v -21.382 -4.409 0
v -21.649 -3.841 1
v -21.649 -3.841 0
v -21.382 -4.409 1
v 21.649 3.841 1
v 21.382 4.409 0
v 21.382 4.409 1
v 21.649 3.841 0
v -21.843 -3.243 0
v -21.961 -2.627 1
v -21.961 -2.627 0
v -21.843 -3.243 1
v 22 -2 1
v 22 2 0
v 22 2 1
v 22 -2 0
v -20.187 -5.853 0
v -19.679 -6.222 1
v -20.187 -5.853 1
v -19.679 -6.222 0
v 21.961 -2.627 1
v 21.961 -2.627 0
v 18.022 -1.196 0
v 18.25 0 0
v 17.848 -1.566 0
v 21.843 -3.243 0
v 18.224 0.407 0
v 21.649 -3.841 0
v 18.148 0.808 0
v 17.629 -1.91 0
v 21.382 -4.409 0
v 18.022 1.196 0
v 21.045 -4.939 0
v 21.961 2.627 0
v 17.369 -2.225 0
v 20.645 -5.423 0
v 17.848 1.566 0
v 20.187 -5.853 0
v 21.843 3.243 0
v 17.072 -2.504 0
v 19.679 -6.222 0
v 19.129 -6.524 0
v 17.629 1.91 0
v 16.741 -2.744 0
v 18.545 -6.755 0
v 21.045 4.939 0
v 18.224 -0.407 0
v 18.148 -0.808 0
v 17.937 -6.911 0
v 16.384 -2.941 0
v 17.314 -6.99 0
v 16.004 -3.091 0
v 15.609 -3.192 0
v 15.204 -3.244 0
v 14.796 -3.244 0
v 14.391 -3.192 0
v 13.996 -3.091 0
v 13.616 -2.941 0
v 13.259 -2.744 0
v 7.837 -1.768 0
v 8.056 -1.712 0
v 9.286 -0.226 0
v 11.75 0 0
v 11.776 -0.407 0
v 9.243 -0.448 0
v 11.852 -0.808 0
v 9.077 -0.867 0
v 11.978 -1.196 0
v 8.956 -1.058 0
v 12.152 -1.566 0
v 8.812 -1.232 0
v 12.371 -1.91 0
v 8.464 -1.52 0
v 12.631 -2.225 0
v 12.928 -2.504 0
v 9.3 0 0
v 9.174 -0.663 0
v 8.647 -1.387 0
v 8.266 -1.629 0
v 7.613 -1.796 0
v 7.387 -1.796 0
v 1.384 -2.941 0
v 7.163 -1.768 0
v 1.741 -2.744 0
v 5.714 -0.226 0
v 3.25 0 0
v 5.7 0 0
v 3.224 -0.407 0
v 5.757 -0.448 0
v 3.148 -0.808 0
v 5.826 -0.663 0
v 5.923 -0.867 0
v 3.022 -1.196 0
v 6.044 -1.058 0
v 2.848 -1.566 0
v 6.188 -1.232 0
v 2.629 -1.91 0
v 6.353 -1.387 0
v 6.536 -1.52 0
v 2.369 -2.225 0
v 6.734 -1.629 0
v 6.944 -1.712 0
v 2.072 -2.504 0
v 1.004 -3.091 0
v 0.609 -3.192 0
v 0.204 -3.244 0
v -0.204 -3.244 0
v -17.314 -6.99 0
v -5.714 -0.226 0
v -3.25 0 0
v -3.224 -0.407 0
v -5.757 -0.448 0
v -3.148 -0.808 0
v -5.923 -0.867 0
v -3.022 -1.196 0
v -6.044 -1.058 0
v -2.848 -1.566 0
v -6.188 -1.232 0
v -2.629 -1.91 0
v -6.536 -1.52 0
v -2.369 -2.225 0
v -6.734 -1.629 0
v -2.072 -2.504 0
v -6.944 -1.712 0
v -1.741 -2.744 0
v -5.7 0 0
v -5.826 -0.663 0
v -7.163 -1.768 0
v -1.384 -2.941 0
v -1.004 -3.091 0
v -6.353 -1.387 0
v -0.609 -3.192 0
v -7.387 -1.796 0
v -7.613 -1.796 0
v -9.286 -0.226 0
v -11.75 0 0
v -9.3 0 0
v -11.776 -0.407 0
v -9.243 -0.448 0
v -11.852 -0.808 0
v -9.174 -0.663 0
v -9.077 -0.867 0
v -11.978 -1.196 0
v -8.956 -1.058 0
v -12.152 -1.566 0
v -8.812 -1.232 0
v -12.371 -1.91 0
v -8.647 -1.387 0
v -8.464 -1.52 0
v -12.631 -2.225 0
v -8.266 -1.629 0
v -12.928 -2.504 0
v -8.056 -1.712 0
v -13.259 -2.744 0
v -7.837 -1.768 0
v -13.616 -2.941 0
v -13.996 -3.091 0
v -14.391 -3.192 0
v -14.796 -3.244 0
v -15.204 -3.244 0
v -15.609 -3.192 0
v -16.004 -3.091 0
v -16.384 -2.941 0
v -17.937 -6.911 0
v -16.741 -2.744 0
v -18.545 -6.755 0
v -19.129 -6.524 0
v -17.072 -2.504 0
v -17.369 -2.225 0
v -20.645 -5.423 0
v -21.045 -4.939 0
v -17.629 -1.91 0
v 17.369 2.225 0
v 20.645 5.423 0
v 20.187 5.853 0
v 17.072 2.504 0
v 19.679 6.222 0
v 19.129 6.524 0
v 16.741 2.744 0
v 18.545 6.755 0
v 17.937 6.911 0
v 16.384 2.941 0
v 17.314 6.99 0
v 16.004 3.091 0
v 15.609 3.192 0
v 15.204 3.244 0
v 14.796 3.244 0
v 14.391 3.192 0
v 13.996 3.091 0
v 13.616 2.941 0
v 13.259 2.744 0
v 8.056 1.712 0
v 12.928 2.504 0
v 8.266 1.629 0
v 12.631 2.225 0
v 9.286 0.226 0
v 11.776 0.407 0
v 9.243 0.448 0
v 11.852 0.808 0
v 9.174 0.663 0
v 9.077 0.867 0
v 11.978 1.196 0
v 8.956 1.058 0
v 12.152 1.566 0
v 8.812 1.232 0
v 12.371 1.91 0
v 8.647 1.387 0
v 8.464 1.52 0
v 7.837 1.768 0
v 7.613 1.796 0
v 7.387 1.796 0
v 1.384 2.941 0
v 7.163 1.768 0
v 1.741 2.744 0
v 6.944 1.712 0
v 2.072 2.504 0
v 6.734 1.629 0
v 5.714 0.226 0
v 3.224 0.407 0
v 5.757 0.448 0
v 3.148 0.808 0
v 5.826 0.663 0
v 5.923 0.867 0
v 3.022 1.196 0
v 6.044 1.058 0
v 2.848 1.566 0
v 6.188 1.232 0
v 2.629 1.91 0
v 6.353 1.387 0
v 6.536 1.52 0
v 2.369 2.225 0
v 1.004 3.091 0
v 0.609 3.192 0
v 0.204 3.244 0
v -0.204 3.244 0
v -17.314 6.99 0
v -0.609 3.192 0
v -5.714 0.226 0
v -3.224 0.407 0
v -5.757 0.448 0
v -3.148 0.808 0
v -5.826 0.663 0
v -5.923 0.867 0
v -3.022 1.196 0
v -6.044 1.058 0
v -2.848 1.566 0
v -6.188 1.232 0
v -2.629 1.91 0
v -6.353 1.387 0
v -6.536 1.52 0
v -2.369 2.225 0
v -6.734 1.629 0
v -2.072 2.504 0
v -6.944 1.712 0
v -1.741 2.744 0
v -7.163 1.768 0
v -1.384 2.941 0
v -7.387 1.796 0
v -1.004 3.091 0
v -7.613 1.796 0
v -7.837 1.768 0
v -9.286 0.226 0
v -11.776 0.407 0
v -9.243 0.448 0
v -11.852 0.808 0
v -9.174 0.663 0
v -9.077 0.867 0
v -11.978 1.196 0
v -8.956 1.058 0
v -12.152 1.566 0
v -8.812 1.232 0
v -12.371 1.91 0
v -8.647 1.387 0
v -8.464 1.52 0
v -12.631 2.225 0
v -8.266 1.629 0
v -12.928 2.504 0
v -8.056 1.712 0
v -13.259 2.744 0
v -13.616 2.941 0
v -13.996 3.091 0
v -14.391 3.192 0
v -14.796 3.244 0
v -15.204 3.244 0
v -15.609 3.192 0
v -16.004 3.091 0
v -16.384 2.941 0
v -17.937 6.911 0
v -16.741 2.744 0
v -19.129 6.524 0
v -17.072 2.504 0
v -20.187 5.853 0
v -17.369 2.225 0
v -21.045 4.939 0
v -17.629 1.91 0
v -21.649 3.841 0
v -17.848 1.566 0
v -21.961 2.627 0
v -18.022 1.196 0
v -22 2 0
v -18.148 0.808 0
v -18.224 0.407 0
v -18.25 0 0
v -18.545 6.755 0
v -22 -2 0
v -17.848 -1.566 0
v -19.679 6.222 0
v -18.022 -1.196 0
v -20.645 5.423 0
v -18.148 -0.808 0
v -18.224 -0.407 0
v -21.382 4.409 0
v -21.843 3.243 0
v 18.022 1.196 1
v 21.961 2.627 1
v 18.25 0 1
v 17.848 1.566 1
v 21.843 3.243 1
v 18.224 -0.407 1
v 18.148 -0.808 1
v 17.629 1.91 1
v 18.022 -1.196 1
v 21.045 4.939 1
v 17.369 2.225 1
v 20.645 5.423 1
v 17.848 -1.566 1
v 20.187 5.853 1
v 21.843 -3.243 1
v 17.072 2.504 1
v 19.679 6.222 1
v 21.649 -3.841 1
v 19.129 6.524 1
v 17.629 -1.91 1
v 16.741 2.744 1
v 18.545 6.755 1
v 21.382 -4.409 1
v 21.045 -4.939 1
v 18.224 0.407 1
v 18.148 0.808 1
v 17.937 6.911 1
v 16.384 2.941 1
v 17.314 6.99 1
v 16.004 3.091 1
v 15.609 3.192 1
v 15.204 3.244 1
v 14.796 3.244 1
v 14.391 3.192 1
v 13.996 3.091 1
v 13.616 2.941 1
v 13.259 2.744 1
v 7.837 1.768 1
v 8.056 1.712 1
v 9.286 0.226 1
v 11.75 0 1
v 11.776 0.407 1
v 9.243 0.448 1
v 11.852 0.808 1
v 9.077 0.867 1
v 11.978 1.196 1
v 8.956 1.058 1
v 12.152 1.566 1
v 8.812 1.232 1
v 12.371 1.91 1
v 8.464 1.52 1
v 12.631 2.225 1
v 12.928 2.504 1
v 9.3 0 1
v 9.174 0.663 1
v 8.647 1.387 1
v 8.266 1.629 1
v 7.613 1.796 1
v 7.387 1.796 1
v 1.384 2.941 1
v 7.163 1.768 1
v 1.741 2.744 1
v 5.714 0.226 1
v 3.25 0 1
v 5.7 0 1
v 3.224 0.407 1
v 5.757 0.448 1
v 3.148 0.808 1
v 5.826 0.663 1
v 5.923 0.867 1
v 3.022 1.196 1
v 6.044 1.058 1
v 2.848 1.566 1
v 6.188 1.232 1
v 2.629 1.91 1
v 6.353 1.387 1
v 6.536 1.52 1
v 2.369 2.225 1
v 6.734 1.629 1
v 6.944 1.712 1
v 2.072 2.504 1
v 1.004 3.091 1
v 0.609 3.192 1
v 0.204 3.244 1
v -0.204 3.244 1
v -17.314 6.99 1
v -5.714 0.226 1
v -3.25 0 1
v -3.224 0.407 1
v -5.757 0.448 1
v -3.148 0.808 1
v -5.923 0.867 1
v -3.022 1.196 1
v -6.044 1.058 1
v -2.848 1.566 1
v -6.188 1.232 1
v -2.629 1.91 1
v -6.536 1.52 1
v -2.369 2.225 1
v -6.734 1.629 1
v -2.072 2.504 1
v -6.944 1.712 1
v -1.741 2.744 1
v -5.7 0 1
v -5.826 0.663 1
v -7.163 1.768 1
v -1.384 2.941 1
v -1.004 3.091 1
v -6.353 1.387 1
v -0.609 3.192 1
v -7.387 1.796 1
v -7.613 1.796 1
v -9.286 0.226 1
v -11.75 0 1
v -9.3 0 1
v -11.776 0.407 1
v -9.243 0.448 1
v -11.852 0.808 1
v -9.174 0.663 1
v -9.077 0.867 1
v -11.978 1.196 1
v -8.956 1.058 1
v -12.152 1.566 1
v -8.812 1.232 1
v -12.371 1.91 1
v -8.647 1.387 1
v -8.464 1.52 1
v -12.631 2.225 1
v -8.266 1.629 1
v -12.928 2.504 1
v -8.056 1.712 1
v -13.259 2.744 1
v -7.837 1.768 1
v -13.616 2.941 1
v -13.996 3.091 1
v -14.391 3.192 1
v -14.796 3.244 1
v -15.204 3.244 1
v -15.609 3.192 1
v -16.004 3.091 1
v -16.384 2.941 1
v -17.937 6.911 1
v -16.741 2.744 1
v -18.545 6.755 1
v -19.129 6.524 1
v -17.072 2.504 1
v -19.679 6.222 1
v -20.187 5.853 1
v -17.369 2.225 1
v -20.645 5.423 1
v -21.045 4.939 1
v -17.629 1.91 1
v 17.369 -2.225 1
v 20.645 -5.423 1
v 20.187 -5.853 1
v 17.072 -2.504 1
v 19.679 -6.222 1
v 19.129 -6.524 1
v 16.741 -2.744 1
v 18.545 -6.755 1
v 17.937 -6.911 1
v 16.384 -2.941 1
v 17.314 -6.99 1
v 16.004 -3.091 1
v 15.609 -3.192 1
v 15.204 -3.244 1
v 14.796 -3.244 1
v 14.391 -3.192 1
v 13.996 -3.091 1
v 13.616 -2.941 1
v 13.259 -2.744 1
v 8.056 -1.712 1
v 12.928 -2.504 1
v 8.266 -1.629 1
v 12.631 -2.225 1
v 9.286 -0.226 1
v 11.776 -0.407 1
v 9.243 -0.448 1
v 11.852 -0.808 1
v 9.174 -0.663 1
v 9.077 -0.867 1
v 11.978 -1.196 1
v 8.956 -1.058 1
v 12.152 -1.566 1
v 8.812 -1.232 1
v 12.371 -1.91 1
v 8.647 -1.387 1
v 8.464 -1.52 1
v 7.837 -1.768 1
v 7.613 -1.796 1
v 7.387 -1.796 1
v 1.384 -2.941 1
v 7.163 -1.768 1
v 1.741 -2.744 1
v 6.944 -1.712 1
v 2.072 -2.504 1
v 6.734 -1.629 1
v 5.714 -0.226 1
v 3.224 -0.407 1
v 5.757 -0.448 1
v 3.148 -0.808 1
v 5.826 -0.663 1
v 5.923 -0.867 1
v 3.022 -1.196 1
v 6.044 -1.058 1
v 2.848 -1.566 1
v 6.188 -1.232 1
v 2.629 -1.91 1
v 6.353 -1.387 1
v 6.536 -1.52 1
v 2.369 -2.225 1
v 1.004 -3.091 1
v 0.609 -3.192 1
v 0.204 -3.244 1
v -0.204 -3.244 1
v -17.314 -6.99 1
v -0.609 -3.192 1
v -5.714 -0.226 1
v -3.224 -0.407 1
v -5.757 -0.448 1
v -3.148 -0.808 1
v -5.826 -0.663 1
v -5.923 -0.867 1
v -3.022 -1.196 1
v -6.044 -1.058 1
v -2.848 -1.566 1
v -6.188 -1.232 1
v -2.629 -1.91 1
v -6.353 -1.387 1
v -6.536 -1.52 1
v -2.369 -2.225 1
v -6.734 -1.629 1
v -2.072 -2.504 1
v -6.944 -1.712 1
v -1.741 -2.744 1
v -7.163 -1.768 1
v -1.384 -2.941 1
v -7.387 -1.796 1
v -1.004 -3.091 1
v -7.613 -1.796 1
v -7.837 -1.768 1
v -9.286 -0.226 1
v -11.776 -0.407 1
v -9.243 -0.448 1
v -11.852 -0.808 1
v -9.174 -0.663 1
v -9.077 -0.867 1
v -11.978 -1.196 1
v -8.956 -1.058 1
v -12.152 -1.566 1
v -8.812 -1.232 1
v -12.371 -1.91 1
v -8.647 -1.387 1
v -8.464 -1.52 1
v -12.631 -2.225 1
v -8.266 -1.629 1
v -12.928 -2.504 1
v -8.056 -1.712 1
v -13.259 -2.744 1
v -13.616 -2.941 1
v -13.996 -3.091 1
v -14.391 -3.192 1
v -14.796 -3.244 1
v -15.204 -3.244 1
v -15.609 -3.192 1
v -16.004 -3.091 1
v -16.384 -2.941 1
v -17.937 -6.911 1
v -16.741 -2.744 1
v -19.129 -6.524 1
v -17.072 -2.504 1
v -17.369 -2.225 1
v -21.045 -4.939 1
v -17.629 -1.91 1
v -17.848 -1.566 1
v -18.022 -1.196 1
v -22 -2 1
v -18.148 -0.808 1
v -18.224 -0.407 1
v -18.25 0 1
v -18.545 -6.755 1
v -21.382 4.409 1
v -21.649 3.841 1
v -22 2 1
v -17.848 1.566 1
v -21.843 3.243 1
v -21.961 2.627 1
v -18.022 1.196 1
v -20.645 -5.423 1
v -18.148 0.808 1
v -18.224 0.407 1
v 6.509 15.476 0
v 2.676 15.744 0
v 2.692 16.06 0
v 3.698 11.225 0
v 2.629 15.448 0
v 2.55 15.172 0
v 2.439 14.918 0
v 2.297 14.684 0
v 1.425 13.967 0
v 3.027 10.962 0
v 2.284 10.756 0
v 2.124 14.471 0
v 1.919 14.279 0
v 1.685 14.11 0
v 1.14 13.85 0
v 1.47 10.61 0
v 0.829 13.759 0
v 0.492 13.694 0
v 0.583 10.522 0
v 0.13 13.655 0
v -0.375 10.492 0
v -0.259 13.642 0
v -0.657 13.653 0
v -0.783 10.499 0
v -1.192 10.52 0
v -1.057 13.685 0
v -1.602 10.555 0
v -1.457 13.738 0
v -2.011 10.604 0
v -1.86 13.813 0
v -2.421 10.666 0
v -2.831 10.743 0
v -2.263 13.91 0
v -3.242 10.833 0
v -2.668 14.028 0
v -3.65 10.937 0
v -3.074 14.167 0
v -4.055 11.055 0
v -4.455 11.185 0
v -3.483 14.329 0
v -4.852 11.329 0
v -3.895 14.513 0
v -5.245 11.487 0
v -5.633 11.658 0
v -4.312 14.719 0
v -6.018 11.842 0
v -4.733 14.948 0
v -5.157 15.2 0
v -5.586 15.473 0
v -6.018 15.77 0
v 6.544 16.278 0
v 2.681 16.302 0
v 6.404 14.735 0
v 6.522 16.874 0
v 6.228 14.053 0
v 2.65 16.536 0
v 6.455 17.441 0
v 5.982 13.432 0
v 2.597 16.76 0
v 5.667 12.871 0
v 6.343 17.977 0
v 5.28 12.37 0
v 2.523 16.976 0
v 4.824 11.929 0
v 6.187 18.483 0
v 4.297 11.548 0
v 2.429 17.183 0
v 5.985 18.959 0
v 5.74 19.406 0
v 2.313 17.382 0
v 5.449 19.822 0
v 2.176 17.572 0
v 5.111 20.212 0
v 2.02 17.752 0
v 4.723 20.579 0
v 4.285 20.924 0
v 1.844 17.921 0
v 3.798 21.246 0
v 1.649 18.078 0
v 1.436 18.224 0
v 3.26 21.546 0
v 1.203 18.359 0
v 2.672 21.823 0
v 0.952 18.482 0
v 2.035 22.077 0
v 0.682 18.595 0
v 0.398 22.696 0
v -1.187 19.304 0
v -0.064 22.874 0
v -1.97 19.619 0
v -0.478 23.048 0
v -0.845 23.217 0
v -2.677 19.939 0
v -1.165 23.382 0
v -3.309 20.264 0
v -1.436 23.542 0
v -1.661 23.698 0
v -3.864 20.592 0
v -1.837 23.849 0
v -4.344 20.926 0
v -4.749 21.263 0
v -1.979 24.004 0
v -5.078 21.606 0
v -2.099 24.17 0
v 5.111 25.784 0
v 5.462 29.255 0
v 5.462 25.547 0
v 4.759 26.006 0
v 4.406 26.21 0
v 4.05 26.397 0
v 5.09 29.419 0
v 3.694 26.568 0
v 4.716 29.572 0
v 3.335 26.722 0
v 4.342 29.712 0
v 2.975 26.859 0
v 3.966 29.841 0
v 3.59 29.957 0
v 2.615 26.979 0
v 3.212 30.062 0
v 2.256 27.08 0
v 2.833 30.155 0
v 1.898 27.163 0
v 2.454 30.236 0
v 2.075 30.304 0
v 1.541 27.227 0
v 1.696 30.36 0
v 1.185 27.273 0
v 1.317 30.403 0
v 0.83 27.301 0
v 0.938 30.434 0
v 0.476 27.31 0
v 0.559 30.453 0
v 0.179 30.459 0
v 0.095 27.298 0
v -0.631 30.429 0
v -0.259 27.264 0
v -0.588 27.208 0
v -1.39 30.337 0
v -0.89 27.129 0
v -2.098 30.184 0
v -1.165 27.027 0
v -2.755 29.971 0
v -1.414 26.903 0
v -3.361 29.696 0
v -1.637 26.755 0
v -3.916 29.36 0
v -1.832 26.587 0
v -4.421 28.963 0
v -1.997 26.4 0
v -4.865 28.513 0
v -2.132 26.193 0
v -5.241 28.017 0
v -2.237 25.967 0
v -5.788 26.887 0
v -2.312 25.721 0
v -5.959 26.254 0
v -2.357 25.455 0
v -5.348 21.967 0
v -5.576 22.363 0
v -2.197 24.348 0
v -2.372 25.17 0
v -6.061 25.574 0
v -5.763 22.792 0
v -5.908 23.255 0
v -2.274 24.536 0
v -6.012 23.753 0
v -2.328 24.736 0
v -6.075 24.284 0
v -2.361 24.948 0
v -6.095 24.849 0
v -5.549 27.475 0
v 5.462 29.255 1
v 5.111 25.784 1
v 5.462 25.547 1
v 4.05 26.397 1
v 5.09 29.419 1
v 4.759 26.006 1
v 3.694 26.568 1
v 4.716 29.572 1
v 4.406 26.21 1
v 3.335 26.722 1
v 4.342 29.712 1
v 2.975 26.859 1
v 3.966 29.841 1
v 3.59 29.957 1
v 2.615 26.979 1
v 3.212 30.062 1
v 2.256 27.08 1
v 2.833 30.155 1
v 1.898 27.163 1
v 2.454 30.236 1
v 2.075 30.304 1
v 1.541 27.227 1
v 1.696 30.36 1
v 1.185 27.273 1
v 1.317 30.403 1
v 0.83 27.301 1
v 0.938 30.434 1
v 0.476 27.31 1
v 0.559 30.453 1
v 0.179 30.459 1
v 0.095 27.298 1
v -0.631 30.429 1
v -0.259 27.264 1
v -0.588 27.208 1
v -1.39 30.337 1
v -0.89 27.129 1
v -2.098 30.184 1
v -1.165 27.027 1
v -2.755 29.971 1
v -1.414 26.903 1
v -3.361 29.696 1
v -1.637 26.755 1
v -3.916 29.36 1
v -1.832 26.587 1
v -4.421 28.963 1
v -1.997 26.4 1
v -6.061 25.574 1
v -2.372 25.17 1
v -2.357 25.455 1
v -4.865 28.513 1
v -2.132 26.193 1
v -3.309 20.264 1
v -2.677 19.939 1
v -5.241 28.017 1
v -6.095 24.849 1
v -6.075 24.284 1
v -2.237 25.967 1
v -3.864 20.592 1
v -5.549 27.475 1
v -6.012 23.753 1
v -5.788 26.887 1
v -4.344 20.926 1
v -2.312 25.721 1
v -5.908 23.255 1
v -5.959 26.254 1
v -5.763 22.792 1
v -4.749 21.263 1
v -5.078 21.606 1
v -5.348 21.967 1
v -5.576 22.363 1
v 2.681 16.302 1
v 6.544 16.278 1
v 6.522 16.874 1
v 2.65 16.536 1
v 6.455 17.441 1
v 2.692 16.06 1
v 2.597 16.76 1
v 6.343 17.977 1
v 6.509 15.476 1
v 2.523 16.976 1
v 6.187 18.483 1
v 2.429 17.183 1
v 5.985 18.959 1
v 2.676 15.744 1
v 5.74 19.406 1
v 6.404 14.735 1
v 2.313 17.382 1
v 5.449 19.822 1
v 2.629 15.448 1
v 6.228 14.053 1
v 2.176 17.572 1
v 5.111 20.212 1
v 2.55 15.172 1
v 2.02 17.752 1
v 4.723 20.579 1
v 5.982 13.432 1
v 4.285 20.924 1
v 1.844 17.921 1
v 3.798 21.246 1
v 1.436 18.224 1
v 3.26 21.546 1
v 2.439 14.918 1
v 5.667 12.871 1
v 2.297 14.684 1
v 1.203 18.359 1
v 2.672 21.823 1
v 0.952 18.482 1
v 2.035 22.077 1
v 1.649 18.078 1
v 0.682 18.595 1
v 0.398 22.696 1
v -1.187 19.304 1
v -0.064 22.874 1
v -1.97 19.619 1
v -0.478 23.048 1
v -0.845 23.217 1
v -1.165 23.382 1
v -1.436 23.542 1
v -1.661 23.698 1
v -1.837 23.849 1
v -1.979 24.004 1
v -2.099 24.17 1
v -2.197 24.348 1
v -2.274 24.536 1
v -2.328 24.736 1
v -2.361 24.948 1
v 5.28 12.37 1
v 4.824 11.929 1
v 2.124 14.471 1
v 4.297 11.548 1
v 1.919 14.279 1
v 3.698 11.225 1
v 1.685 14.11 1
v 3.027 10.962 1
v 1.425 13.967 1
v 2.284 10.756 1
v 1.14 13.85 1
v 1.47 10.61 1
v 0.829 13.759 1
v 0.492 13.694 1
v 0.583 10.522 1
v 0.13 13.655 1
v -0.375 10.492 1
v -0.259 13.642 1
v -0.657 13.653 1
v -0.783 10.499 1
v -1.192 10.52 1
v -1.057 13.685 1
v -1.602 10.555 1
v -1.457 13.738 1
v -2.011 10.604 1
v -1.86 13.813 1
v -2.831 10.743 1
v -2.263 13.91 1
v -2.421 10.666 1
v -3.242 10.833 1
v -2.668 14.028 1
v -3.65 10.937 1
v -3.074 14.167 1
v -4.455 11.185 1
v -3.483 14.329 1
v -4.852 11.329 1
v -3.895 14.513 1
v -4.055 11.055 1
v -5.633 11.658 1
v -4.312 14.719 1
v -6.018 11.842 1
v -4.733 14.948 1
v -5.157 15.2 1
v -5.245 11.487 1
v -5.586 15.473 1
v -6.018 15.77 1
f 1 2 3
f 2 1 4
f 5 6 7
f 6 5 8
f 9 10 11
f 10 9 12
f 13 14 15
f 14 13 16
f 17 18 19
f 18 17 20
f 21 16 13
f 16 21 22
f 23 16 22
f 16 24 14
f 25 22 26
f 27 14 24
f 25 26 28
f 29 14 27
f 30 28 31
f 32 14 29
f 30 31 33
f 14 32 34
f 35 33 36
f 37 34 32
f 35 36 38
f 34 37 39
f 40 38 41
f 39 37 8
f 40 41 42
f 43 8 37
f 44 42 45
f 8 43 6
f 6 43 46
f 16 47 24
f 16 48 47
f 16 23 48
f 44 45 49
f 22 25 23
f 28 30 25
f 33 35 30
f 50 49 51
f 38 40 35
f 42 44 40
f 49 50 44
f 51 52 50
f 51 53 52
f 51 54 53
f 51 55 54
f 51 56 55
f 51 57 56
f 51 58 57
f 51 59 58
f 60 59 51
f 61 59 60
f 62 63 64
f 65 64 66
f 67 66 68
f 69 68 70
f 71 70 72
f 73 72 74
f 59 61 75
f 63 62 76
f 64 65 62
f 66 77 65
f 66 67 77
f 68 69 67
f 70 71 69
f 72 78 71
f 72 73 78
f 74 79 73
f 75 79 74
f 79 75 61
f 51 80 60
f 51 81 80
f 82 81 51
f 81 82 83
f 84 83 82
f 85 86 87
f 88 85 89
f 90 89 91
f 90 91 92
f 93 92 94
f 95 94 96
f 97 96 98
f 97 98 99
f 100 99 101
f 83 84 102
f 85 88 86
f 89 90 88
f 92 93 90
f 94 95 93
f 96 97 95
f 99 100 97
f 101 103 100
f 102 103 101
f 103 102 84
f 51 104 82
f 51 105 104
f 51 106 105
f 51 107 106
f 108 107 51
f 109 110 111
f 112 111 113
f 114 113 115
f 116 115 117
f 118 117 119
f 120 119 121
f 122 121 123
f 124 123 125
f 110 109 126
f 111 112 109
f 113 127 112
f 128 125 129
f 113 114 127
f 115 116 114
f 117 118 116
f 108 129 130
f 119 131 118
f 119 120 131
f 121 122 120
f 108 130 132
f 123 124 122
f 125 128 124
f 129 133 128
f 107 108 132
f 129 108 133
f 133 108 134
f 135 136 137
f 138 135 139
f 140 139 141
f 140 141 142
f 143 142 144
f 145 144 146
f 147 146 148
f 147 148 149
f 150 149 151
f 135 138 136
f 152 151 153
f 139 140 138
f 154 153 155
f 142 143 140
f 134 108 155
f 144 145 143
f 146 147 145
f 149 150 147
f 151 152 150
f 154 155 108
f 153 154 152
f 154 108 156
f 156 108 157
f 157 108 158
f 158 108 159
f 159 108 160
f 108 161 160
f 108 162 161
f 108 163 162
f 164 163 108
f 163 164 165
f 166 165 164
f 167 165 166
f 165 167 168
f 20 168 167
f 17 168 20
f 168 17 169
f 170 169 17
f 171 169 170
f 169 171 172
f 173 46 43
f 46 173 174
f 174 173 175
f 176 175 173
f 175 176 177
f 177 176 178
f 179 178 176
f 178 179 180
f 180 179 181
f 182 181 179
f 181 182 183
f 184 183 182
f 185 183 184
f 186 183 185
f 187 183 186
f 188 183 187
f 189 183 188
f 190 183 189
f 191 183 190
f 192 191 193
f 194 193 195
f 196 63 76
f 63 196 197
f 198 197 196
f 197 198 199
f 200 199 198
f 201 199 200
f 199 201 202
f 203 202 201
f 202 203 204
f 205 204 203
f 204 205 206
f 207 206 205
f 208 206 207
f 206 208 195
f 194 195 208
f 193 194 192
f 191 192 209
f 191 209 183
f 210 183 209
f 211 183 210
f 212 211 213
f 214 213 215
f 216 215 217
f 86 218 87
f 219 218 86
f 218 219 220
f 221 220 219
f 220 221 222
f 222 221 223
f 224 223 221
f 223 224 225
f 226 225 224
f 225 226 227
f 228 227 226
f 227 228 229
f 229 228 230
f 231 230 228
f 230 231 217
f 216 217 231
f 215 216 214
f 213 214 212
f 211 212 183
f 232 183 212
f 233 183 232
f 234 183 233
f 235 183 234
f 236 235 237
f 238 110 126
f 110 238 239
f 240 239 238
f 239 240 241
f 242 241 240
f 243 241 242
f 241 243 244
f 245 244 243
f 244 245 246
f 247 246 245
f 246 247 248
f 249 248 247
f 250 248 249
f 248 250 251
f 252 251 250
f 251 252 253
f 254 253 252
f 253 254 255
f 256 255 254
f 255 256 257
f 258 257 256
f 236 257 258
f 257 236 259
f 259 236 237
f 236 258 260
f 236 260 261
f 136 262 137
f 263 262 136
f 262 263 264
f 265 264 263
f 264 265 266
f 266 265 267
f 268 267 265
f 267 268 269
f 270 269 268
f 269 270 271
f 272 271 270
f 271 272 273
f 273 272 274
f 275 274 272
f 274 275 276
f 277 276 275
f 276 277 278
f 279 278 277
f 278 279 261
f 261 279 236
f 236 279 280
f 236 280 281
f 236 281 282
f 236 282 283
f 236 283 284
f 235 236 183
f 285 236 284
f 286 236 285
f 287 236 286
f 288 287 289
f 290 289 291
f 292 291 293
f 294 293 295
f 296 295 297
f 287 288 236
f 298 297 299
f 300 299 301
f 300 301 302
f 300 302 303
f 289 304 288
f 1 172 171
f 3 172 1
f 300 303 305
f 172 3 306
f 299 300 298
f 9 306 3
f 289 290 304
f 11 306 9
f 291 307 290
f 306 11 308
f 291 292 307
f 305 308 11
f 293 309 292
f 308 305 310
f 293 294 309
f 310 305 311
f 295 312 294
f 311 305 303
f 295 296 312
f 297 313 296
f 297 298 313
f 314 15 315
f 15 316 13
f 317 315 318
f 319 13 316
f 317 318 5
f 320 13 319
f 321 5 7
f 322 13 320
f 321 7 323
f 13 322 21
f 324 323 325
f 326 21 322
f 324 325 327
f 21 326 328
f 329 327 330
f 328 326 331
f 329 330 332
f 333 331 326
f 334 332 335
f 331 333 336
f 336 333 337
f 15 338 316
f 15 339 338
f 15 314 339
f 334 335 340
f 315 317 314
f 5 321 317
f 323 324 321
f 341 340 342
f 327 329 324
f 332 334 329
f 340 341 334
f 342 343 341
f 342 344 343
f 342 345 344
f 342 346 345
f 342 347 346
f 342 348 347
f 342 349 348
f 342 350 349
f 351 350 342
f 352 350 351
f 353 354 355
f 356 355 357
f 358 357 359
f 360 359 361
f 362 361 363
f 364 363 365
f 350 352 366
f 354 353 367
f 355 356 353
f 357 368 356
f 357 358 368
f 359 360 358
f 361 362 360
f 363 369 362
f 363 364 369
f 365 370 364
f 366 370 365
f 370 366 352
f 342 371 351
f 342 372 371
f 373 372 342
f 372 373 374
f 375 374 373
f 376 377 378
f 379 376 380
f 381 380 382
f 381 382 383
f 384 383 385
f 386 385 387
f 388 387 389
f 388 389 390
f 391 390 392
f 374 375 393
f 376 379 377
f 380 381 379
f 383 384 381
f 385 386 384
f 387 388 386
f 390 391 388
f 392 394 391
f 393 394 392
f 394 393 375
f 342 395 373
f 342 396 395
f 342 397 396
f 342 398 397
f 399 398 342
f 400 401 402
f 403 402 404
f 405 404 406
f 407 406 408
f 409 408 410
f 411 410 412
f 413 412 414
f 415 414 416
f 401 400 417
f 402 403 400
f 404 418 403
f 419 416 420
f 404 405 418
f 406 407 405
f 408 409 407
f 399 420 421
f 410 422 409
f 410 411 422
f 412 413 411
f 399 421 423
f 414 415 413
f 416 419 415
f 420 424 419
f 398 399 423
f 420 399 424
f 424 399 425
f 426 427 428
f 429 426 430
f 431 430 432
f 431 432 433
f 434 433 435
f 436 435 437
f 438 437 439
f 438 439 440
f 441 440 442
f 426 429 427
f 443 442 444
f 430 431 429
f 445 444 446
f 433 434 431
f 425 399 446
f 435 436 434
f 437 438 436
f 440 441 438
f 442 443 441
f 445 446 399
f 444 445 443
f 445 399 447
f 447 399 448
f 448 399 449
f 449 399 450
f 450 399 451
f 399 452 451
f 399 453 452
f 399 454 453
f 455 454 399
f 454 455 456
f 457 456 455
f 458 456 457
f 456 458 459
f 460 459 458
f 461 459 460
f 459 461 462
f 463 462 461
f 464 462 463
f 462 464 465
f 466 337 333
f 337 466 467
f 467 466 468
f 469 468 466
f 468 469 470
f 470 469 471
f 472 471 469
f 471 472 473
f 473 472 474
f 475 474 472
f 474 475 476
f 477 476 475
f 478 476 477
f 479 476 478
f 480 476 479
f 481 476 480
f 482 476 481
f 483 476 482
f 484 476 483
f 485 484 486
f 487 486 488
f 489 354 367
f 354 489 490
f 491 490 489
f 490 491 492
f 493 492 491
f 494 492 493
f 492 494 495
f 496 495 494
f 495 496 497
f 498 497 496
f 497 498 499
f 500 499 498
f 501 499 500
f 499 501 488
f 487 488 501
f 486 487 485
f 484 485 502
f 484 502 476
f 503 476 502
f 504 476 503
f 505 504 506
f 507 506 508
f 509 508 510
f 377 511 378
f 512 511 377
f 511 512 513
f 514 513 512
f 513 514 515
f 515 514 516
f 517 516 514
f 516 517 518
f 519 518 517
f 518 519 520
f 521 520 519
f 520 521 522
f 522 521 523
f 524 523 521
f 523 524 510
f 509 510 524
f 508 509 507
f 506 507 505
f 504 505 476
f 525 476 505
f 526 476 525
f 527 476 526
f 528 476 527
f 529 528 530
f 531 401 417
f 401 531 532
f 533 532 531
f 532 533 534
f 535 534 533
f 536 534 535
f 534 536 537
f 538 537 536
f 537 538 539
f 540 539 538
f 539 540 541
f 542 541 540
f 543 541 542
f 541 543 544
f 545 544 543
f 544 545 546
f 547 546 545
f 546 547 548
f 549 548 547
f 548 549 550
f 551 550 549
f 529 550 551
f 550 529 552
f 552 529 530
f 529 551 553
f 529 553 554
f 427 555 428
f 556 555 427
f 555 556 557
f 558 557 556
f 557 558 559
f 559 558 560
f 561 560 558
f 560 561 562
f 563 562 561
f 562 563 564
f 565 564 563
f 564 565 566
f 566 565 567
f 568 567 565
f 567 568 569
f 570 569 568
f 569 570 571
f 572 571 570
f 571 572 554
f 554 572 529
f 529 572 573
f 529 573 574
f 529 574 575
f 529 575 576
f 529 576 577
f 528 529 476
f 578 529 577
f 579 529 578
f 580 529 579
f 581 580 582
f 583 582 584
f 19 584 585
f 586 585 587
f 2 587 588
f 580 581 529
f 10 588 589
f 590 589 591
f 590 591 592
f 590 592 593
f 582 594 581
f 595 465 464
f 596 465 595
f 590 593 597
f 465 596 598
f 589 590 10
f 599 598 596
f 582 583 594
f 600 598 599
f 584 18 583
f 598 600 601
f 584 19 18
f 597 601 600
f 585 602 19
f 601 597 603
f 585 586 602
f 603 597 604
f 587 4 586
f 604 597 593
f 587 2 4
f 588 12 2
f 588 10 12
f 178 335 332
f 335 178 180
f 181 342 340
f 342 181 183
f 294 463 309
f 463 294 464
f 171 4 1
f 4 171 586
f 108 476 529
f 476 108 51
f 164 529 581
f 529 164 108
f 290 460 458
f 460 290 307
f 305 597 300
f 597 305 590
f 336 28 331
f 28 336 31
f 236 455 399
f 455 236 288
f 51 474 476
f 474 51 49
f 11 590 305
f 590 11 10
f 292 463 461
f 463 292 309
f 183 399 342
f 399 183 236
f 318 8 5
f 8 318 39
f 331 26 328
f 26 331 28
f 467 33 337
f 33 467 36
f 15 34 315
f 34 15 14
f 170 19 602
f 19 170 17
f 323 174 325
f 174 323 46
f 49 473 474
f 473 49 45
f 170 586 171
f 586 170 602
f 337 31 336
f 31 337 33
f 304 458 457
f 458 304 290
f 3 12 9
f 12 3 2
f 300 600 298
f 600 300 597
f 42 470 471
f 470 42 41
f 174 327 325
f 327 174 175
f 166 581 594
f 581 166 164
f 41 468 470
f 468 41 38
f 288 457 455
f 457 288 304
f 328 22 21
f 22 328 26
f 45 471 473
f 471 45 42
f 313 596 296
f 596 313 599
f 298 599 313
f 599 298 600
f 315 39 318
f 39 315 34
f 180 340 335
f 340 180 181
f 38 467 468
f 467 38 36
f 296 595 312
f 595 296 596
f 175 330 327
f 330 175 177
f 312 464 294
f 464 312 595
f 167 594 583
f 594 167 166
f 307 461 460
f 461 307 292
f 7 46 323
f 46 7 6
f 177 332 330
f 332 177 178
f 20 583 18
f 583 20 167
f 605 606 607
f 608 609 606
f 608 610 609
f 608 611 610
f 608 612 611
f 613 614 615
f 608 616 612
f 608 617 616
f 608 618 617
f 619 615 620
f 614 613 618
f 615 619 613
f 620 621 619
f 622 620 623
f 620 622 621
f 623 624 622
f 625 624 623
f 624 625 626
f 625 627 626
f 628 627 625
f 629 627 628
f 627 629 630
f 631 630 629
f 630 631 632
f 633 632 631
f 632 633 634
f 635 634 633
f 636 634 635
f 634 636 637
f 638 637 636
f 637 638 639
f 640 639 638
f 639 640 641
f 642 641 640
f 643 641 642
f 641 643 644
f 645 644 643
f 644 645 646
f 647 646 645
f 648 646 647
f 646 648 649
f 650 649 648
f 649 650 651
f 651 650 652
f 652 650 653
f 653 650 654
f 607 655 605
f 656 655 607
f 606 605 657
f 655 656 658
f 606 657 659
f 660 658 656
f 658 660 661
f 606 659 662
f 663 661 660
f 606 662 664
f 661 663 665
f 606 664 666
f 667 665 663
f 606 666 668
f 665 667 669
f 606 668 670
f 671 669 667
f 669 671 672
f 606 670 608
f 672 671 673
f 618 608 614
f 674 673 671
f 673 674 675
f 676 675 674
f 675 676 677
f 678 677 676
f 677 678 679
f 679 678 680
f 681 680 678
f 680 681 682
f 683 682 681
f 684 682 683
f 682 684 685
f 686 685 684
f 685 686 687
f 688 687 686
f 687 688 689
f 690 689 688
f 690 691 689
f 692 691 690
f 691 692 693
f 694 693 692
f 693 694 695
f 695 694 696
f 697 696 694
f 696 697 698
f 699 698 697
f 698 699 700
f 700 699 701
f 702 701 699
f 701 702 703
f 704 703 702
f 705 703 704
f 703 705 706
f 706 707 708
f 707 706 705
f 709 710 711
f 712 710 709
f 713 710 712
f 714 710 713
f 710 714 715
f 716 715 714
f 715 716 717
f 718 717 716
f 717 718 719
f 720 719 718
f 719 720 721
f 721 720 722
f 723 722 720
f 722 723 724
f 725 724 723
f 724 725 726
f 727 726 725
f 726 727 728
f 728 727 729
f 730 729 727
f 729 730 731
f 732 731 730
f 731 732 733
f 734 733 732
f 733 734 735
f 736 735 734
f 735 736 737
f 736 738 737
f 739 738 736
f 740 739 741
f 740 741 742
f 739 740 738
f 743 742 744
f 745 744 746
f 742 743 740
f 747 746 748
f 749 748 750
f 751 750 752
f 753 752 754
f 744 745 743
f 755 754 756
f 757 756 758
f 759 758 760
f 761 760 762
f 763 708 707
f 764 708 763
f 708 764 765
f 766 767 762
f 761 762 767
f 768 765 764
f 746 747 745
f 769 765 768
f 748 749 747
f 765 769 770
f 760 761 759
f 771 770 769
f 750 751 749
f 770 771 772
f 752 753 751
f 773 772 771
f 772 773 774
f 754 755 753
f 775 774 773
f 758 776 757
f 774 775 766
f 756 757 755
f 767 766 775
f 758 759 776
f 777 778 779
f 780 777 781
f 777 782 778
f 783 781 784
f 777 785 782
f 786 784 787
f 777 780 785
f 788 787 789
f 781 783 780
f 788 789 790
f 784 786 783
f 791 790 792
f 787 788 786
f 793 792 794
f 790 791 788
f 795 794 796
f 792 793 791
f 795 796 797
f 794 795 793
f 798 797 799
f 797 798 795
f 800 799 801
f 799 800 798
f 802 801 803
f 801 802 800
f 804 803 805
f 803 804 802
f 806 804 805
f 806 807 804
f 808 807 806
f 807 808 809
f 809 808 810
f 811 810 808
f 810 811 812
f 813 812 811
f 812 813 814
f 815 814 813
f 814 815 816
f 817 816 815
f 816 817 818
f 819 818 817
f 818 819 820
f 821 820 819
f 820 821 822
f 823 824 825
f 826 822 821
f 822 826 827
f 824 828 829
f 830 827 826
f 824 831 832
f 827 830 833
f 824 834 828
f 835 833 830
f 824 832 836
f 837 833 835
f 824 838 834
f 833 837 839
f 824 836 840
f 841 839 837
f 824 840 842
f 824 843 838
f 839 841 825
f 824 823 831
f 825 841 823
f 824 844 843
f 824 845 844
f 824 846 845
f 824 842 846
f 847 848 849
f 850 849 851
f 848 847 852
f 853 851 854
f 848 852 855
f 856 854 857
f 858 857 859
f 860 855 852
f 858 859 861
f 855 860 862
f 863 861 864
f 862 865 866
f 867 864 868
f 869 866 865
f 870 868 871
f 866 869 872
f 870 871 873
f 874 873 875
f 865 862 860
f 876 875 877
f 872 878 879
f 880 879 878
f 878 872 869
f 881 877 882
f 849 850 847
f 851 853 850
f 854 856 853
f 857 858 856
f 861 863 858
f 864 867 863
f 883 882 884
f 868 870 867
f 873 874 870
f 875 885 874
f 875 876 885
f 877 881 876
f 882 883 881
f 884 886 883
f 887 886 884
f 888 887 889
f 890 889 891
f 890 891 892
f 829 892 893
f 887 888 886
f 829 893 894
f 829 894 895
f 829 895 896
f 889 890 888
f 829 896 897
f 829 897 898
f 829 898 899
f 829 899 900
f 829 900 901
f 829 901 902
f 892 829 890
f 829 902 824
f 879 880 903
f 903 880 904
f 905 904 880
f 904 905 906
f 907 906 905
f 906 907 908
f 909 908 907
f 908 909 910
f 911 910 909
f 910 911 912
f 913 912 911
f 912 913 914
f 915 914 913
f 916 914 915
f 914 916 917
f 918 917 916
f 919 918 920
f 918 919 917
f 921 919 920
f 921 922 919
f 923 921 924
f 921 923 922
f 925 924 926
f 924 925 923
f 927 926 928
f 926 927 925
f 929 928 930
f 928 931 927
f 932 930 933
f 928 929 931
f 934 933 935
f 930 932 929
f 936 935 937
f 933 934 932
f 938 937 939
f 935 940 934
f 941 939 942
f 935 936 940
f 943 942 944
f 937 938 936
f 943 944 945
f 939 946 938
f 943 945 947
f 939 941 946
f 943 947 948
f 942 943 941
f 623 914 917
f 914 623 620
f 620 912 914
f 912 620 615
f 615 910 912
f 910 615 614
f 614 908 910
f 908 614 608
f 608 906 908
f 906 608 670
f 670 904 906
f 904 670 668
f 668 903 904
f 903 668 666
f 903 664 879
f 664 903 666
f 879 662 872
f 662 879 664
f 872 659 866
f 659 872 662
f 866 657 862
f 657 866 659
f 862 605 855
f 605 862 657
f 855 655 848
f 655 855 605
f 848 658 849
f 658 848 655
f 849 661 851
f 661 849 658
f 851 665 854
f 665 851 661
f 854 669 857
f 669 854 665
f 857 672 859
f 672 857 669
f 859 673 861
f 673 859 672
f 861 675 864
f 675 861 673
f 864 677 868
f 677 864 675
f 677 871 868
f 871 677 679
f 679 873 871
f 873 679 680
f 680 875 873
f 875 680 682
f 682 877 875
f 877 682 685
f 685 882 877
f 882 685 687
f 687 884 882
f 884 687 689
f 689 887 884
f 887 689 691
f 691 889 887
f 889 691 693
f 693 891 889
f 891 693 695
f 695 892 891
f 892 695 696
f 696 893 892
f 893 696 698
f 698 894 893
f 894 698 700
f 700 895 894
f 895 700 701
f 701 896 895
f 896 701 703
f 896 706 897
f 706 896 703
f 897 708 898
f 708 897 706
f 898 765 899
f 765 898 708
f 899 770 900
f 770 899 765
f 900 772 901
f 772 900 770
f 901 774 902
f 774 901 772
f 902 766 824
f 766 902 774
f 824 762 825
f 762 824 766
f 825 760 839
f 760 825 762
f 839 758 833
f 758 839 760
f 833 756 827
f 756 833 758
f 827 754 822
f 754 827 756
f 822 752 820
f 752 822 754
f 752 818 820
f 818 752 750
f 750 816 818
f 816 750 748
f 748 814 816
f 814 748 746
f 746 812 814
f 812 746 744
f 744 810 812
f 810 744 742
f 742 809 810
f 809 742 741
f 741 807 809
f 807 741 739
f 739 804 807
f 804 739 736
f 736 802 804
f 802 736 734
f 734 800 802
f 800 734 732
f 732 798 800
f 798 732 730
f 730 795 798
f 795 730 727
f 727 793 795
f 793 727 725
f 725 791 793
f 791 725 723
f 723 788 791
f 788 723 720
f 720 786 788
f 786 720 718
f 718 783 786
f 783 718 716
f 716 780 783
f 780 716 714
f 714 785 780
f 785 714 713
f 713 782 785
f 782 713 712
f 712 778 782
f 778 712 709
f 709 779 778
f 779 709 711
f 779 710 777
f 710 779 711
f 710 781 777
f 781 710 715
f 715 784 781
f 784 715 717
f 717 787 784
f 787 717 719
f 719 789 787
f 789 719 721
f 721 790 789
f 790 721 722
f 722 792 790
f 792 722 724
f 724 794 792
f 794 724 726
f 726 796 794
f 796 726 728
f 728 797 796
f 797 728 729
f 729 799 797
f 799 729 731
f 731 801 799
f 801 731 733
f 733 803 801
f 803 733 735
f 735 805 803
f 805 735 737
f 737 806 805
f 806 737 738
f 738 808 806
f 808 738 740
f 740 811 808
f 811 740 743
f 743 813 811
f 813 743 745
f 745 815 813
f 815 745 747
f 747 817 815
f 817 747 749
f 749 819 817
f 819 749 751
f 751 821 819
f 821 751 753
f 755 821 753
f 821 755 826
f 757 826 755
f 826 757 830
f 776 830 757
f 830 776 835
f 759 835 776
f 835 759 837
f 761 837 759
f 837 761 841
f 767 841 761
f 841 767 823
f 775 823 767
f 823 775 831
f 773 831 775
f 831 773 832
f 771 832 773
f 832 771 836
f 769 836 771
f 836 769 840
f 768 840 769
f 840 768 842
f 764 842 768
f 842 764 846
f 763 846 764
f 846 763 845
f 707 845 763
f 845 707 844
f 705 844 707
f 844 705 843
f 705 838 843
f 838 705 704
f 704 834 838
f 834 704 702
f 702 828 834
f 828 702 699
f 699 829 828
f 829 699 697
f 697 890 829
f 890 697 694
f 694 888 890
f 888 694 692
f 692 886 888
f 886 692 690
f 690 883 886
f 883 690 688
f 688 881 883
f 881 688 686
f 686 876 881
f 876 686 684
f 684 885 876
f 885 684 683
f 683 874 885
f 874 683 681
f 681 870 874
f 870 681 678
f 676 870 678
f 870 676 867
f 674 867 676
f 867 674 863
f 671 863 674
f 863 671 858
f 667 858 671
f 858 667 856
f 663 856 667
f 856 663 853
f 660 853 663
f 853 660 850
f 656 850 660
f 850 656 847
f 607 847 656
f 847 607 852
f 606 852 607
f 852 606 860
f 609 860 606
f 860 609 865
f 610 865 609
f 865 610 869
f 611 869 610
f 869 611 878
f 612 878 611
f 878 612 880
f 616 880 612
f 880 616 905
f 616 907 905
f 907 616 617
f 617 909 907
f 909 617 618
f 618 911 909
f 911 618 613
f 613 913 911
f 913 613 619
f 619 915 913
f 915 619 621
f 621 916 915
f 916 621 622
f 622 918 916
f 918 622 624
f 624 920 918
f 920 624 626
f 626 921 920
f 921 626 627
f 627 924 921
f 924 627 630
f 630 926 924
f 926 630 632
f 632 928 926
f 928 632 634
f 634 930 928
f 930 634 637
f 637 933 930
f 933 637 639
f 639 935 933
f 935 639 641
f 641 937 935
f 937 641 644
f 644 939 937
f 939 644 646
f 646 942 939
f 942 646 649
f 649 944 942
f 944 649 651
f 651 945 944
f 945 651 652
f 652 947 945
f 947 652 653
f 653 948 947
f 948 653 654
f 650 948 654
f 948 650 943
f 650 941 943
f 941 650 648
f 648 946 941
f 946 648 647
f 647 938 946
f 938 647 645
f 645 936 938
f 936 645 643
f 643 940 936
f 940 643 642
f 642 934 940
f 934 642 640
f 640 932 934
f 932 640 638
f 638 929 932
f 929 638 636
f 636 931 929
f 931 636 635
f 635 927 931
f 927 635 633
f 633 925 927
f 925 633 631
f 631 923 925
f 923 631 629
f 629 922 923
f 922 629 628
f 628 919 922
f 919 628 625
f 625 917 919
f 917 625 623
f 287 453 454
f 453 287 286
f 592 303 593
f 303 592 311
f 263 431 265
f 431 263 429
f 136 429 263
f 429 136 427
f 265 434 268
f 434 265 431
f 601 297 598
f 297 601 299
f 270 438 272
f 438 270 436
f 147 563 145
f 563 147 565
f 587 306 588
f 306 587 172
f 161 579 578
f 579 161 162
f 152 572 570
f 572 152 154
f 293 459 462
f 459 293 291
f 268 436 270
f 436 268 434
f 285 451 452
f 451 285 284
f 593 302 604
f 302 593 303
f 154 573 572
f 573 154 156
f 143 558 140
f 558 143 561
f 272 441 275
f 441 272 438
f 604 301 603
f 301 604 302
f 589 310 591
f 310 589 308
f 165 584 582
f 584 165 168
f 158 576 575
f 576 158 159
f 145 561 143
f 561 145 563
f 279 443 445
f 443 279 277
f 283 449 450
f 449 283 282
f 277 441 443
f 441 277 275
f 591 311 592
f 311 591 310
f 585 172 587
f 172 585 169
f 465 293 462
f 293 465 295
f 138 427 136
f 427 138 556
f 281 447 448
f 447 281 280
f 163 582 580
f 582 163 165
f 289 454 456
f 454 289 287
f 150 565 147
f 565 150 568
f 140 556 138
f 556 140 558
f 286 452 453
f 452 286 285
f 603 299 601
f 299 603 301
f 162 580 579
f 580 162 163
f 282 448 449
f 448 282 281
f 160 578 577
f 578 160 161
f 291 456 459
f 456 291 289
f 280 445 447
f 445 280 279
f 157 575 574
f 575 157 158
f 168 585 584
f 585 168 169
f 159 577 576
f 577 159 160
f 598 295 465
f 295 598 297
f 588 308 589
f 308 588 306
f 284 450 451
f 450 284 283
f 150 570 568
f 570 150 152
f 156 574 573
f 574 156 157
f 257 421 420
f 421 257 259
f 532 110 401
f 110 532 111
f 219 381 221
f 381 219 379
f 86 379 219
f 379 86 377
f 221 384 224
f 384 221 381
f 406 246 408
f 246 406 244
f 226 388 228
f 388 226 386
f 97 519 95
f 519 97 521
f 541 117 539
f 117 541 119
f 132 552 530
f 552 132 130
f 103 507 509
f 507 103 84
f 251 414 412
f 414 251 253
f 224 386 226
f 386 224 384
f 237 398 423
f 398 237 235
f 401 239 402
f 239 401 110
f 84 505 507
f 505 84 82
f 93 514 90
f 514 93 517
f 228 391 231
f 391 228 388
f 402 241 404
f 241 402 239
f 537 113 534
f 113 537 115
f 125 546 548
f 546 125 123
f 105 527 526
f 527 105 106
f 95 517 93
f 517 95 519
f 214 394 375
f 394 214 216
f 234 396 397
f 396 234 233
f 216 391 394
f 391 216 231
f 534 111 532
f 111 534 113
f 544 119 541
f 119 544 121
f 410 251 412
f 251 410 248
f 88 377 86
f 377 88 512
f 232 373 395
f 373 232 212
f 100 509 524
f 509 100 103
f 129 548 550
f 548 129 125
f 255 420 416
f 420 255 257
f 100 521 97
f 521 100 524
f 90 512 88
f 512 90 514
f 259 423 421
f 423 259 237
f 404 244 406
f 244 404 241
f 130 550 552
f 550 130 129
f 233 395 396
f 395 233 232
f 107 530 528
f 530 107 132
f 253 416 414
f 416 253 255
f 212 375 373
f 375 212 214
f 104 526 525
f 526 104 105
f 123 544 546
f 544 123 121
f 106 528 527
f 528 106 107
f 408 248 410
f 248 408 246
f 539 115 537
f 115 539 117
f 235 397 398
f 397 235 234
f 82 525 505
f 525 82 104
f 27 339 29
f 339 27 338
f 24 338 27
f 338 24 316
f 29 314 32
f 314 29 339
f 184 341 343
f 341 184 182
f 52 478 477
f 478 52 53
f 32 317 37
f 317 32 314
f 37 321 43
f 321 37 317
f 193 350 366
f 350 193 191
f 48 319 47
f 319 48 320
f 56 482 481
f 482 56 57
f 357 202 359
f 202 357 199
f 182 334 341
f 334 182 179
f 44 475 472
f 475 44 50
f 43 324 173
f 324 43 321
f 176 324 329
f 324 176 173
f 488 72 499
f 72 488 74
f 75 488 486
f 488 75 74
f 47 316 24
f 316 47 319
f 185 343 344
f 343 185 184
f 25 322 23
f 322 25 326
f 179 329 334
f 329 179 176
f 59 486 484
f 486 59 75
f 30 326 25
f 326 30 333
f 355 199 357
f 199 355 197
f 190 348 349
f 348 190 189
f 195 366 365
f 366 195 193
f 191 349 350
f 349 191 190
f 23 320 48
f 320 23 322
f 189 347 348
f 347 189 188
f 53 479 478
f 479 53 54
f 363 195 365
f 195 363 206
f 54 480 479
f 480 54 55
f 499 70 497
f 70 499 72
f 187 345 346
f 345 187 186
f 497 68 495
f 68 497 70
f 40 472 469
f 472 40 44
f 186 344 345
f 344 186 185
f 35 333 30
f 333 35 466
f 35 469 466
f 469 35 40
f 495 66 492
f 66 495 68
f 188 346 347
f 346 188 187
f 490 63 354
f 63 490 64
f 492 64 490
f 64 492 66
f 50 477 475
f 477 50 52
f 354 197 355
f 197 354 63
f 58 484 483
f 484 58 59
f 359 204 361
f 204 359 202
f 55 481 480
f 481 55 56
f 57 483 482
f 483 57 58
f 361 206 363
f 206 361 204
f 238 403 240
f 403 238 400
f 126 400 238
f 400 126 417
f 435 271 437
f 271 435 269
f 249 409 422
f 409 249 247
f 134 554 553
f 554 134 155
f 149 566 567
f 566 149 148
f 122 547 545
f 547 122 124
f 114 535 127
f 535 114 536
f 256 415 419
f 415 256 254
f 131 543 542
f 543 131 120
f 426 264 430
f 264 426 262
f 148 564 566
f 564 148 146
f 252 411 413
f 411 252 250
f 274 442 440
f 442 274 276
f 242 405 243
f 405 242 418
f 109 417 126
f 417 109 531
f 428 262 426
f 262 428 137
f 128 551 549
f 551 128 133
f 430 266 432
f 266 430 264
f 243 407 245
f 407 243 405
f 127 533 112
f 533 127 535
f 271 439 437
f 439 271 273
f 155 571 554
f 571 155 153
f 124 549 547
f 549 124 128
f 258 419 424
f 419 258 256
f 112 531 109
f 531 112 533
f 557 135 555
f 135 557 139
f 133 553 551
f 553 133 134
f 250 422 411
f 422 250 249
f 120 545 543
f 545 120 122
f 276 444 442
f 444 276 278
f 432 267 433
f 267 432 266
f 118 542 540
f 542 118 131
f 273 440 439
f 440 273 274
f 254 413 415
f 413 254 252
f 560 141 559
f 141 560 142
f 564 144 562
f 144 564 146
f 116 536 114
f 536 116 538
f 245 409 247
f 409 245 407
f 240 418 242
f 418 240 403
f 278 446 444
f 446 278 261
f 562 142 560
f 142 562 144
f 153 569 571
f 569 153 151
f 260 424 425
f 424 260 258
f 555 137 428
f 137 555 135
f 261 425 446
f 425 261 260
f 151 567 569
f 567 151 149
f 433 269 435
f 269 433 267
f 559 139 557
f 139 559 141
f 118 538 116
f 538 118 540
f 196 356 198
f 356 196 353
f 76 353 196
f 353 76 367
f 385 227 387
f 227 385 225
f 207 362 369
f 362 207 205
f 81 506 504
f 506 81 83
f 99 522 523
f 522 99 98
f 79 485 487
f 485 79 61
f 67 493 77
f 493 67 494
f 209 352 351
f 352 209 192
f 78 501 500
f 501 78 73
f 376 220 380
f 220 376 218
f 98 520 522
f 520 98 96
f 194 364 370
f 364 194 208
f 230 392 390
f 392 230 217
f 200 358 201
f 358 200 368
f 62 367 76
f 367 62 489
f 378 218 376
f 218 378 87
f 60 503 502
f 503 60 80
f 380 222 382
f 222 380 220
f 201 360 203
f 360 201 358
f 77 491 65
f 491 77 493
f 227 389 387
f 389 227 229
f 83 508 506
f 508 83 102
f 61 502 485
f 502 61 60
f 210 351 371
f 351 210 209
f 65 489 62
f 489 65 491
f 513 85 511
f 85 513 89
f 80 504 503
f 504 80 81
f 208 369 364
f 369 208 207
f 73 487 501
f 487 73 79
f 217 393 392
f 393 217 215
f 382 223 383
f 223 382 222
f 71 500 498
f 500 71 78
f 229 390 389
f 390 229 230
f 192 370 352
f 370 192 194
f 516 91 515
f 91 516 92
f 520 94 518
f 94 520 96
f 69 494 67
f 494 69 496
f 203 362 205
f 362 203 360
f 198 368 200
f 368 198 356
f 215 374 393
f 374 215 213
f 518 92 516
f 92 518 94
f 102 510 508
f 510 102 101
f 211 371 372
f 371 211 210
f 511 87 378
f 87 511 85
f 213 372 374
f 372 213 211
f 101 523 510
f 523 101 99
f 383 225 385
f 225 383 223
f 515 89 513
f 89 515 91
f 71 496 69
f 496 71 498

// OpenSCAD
$fn = 50;


difference() {
	union() {
		hull() {
			translate(v = [-17.0000000000, 2.0000000000, 0]) {
				cylinder(h = 1, r = 5);
			}
			translate(v = [17.0000000000, 2.0000000000, 0]) {
				cylinder(h = 1, r = 5);
			}
			translate(v = [-17.0000000000, -2.0000000000, 0]) {
				cylinder(h = 1, r = 5);
			}
			translate(v = [17.0000000000, -2.0000000000, 0]) {
				cylinder(h = 1, r = 5);
			}
		}
		translate(v = [0, 30.0000000000, 0]) {
			linear_extrude(height = 1) {
				text(font = "DejaVu Sans Mono:style=Bold", halign = "center", size = 19.0000000000, text = "S", valign = "top");
			}
		}
	}
	union() {
		translate(v = [-15.0000000000, 0.0000000000, 0]) {
			translate(v = [0, 0, -100]) {
				cylinder(h = 200, r = 3.2500000000);
			}
		}
		translate(v = [0, 0, -100]) {
			cylinder(h = 200, r = 3.2500000000);
		}
		translate(v = [15.0000000000, 0.0000000000, 0]) {
			translate(v = [0, 0, -100]) {
				cylinder(h = 200, r = 3.2500000000);
			}
		}
		translate(v = [-15.0000000000, 0.0000000000, 0]) {
			translate(v = [0, 0, -100]) {
				cylinder(h = 200, r = 1.8000000000);
			}
		}
		translate(v = [-7.5000000000, 0.0000000000, 0]) {
			translate(v = [0, 0, -100]) {
				cylinder(h = 200, r = 1.8000000000);
			}
		}
		translate(v = [0, 0, -100]) {
			cylinder(h = 200, r = 1.8000000000);
		}
		translate(v = [7.5000000000, 0.0000000000, 0]) {
			translate(v = [0, 0, -100]) {
				cylinder(h = 200, r = 1.8000000000);
			}
		}
		translate(v = [15.0000000000, 0.0000000000, 0]) {
			translate(v = [0, 0, -100]) {
				cylinder(h = 200, r = 1.8000000000);
			}
		}
	}
}
